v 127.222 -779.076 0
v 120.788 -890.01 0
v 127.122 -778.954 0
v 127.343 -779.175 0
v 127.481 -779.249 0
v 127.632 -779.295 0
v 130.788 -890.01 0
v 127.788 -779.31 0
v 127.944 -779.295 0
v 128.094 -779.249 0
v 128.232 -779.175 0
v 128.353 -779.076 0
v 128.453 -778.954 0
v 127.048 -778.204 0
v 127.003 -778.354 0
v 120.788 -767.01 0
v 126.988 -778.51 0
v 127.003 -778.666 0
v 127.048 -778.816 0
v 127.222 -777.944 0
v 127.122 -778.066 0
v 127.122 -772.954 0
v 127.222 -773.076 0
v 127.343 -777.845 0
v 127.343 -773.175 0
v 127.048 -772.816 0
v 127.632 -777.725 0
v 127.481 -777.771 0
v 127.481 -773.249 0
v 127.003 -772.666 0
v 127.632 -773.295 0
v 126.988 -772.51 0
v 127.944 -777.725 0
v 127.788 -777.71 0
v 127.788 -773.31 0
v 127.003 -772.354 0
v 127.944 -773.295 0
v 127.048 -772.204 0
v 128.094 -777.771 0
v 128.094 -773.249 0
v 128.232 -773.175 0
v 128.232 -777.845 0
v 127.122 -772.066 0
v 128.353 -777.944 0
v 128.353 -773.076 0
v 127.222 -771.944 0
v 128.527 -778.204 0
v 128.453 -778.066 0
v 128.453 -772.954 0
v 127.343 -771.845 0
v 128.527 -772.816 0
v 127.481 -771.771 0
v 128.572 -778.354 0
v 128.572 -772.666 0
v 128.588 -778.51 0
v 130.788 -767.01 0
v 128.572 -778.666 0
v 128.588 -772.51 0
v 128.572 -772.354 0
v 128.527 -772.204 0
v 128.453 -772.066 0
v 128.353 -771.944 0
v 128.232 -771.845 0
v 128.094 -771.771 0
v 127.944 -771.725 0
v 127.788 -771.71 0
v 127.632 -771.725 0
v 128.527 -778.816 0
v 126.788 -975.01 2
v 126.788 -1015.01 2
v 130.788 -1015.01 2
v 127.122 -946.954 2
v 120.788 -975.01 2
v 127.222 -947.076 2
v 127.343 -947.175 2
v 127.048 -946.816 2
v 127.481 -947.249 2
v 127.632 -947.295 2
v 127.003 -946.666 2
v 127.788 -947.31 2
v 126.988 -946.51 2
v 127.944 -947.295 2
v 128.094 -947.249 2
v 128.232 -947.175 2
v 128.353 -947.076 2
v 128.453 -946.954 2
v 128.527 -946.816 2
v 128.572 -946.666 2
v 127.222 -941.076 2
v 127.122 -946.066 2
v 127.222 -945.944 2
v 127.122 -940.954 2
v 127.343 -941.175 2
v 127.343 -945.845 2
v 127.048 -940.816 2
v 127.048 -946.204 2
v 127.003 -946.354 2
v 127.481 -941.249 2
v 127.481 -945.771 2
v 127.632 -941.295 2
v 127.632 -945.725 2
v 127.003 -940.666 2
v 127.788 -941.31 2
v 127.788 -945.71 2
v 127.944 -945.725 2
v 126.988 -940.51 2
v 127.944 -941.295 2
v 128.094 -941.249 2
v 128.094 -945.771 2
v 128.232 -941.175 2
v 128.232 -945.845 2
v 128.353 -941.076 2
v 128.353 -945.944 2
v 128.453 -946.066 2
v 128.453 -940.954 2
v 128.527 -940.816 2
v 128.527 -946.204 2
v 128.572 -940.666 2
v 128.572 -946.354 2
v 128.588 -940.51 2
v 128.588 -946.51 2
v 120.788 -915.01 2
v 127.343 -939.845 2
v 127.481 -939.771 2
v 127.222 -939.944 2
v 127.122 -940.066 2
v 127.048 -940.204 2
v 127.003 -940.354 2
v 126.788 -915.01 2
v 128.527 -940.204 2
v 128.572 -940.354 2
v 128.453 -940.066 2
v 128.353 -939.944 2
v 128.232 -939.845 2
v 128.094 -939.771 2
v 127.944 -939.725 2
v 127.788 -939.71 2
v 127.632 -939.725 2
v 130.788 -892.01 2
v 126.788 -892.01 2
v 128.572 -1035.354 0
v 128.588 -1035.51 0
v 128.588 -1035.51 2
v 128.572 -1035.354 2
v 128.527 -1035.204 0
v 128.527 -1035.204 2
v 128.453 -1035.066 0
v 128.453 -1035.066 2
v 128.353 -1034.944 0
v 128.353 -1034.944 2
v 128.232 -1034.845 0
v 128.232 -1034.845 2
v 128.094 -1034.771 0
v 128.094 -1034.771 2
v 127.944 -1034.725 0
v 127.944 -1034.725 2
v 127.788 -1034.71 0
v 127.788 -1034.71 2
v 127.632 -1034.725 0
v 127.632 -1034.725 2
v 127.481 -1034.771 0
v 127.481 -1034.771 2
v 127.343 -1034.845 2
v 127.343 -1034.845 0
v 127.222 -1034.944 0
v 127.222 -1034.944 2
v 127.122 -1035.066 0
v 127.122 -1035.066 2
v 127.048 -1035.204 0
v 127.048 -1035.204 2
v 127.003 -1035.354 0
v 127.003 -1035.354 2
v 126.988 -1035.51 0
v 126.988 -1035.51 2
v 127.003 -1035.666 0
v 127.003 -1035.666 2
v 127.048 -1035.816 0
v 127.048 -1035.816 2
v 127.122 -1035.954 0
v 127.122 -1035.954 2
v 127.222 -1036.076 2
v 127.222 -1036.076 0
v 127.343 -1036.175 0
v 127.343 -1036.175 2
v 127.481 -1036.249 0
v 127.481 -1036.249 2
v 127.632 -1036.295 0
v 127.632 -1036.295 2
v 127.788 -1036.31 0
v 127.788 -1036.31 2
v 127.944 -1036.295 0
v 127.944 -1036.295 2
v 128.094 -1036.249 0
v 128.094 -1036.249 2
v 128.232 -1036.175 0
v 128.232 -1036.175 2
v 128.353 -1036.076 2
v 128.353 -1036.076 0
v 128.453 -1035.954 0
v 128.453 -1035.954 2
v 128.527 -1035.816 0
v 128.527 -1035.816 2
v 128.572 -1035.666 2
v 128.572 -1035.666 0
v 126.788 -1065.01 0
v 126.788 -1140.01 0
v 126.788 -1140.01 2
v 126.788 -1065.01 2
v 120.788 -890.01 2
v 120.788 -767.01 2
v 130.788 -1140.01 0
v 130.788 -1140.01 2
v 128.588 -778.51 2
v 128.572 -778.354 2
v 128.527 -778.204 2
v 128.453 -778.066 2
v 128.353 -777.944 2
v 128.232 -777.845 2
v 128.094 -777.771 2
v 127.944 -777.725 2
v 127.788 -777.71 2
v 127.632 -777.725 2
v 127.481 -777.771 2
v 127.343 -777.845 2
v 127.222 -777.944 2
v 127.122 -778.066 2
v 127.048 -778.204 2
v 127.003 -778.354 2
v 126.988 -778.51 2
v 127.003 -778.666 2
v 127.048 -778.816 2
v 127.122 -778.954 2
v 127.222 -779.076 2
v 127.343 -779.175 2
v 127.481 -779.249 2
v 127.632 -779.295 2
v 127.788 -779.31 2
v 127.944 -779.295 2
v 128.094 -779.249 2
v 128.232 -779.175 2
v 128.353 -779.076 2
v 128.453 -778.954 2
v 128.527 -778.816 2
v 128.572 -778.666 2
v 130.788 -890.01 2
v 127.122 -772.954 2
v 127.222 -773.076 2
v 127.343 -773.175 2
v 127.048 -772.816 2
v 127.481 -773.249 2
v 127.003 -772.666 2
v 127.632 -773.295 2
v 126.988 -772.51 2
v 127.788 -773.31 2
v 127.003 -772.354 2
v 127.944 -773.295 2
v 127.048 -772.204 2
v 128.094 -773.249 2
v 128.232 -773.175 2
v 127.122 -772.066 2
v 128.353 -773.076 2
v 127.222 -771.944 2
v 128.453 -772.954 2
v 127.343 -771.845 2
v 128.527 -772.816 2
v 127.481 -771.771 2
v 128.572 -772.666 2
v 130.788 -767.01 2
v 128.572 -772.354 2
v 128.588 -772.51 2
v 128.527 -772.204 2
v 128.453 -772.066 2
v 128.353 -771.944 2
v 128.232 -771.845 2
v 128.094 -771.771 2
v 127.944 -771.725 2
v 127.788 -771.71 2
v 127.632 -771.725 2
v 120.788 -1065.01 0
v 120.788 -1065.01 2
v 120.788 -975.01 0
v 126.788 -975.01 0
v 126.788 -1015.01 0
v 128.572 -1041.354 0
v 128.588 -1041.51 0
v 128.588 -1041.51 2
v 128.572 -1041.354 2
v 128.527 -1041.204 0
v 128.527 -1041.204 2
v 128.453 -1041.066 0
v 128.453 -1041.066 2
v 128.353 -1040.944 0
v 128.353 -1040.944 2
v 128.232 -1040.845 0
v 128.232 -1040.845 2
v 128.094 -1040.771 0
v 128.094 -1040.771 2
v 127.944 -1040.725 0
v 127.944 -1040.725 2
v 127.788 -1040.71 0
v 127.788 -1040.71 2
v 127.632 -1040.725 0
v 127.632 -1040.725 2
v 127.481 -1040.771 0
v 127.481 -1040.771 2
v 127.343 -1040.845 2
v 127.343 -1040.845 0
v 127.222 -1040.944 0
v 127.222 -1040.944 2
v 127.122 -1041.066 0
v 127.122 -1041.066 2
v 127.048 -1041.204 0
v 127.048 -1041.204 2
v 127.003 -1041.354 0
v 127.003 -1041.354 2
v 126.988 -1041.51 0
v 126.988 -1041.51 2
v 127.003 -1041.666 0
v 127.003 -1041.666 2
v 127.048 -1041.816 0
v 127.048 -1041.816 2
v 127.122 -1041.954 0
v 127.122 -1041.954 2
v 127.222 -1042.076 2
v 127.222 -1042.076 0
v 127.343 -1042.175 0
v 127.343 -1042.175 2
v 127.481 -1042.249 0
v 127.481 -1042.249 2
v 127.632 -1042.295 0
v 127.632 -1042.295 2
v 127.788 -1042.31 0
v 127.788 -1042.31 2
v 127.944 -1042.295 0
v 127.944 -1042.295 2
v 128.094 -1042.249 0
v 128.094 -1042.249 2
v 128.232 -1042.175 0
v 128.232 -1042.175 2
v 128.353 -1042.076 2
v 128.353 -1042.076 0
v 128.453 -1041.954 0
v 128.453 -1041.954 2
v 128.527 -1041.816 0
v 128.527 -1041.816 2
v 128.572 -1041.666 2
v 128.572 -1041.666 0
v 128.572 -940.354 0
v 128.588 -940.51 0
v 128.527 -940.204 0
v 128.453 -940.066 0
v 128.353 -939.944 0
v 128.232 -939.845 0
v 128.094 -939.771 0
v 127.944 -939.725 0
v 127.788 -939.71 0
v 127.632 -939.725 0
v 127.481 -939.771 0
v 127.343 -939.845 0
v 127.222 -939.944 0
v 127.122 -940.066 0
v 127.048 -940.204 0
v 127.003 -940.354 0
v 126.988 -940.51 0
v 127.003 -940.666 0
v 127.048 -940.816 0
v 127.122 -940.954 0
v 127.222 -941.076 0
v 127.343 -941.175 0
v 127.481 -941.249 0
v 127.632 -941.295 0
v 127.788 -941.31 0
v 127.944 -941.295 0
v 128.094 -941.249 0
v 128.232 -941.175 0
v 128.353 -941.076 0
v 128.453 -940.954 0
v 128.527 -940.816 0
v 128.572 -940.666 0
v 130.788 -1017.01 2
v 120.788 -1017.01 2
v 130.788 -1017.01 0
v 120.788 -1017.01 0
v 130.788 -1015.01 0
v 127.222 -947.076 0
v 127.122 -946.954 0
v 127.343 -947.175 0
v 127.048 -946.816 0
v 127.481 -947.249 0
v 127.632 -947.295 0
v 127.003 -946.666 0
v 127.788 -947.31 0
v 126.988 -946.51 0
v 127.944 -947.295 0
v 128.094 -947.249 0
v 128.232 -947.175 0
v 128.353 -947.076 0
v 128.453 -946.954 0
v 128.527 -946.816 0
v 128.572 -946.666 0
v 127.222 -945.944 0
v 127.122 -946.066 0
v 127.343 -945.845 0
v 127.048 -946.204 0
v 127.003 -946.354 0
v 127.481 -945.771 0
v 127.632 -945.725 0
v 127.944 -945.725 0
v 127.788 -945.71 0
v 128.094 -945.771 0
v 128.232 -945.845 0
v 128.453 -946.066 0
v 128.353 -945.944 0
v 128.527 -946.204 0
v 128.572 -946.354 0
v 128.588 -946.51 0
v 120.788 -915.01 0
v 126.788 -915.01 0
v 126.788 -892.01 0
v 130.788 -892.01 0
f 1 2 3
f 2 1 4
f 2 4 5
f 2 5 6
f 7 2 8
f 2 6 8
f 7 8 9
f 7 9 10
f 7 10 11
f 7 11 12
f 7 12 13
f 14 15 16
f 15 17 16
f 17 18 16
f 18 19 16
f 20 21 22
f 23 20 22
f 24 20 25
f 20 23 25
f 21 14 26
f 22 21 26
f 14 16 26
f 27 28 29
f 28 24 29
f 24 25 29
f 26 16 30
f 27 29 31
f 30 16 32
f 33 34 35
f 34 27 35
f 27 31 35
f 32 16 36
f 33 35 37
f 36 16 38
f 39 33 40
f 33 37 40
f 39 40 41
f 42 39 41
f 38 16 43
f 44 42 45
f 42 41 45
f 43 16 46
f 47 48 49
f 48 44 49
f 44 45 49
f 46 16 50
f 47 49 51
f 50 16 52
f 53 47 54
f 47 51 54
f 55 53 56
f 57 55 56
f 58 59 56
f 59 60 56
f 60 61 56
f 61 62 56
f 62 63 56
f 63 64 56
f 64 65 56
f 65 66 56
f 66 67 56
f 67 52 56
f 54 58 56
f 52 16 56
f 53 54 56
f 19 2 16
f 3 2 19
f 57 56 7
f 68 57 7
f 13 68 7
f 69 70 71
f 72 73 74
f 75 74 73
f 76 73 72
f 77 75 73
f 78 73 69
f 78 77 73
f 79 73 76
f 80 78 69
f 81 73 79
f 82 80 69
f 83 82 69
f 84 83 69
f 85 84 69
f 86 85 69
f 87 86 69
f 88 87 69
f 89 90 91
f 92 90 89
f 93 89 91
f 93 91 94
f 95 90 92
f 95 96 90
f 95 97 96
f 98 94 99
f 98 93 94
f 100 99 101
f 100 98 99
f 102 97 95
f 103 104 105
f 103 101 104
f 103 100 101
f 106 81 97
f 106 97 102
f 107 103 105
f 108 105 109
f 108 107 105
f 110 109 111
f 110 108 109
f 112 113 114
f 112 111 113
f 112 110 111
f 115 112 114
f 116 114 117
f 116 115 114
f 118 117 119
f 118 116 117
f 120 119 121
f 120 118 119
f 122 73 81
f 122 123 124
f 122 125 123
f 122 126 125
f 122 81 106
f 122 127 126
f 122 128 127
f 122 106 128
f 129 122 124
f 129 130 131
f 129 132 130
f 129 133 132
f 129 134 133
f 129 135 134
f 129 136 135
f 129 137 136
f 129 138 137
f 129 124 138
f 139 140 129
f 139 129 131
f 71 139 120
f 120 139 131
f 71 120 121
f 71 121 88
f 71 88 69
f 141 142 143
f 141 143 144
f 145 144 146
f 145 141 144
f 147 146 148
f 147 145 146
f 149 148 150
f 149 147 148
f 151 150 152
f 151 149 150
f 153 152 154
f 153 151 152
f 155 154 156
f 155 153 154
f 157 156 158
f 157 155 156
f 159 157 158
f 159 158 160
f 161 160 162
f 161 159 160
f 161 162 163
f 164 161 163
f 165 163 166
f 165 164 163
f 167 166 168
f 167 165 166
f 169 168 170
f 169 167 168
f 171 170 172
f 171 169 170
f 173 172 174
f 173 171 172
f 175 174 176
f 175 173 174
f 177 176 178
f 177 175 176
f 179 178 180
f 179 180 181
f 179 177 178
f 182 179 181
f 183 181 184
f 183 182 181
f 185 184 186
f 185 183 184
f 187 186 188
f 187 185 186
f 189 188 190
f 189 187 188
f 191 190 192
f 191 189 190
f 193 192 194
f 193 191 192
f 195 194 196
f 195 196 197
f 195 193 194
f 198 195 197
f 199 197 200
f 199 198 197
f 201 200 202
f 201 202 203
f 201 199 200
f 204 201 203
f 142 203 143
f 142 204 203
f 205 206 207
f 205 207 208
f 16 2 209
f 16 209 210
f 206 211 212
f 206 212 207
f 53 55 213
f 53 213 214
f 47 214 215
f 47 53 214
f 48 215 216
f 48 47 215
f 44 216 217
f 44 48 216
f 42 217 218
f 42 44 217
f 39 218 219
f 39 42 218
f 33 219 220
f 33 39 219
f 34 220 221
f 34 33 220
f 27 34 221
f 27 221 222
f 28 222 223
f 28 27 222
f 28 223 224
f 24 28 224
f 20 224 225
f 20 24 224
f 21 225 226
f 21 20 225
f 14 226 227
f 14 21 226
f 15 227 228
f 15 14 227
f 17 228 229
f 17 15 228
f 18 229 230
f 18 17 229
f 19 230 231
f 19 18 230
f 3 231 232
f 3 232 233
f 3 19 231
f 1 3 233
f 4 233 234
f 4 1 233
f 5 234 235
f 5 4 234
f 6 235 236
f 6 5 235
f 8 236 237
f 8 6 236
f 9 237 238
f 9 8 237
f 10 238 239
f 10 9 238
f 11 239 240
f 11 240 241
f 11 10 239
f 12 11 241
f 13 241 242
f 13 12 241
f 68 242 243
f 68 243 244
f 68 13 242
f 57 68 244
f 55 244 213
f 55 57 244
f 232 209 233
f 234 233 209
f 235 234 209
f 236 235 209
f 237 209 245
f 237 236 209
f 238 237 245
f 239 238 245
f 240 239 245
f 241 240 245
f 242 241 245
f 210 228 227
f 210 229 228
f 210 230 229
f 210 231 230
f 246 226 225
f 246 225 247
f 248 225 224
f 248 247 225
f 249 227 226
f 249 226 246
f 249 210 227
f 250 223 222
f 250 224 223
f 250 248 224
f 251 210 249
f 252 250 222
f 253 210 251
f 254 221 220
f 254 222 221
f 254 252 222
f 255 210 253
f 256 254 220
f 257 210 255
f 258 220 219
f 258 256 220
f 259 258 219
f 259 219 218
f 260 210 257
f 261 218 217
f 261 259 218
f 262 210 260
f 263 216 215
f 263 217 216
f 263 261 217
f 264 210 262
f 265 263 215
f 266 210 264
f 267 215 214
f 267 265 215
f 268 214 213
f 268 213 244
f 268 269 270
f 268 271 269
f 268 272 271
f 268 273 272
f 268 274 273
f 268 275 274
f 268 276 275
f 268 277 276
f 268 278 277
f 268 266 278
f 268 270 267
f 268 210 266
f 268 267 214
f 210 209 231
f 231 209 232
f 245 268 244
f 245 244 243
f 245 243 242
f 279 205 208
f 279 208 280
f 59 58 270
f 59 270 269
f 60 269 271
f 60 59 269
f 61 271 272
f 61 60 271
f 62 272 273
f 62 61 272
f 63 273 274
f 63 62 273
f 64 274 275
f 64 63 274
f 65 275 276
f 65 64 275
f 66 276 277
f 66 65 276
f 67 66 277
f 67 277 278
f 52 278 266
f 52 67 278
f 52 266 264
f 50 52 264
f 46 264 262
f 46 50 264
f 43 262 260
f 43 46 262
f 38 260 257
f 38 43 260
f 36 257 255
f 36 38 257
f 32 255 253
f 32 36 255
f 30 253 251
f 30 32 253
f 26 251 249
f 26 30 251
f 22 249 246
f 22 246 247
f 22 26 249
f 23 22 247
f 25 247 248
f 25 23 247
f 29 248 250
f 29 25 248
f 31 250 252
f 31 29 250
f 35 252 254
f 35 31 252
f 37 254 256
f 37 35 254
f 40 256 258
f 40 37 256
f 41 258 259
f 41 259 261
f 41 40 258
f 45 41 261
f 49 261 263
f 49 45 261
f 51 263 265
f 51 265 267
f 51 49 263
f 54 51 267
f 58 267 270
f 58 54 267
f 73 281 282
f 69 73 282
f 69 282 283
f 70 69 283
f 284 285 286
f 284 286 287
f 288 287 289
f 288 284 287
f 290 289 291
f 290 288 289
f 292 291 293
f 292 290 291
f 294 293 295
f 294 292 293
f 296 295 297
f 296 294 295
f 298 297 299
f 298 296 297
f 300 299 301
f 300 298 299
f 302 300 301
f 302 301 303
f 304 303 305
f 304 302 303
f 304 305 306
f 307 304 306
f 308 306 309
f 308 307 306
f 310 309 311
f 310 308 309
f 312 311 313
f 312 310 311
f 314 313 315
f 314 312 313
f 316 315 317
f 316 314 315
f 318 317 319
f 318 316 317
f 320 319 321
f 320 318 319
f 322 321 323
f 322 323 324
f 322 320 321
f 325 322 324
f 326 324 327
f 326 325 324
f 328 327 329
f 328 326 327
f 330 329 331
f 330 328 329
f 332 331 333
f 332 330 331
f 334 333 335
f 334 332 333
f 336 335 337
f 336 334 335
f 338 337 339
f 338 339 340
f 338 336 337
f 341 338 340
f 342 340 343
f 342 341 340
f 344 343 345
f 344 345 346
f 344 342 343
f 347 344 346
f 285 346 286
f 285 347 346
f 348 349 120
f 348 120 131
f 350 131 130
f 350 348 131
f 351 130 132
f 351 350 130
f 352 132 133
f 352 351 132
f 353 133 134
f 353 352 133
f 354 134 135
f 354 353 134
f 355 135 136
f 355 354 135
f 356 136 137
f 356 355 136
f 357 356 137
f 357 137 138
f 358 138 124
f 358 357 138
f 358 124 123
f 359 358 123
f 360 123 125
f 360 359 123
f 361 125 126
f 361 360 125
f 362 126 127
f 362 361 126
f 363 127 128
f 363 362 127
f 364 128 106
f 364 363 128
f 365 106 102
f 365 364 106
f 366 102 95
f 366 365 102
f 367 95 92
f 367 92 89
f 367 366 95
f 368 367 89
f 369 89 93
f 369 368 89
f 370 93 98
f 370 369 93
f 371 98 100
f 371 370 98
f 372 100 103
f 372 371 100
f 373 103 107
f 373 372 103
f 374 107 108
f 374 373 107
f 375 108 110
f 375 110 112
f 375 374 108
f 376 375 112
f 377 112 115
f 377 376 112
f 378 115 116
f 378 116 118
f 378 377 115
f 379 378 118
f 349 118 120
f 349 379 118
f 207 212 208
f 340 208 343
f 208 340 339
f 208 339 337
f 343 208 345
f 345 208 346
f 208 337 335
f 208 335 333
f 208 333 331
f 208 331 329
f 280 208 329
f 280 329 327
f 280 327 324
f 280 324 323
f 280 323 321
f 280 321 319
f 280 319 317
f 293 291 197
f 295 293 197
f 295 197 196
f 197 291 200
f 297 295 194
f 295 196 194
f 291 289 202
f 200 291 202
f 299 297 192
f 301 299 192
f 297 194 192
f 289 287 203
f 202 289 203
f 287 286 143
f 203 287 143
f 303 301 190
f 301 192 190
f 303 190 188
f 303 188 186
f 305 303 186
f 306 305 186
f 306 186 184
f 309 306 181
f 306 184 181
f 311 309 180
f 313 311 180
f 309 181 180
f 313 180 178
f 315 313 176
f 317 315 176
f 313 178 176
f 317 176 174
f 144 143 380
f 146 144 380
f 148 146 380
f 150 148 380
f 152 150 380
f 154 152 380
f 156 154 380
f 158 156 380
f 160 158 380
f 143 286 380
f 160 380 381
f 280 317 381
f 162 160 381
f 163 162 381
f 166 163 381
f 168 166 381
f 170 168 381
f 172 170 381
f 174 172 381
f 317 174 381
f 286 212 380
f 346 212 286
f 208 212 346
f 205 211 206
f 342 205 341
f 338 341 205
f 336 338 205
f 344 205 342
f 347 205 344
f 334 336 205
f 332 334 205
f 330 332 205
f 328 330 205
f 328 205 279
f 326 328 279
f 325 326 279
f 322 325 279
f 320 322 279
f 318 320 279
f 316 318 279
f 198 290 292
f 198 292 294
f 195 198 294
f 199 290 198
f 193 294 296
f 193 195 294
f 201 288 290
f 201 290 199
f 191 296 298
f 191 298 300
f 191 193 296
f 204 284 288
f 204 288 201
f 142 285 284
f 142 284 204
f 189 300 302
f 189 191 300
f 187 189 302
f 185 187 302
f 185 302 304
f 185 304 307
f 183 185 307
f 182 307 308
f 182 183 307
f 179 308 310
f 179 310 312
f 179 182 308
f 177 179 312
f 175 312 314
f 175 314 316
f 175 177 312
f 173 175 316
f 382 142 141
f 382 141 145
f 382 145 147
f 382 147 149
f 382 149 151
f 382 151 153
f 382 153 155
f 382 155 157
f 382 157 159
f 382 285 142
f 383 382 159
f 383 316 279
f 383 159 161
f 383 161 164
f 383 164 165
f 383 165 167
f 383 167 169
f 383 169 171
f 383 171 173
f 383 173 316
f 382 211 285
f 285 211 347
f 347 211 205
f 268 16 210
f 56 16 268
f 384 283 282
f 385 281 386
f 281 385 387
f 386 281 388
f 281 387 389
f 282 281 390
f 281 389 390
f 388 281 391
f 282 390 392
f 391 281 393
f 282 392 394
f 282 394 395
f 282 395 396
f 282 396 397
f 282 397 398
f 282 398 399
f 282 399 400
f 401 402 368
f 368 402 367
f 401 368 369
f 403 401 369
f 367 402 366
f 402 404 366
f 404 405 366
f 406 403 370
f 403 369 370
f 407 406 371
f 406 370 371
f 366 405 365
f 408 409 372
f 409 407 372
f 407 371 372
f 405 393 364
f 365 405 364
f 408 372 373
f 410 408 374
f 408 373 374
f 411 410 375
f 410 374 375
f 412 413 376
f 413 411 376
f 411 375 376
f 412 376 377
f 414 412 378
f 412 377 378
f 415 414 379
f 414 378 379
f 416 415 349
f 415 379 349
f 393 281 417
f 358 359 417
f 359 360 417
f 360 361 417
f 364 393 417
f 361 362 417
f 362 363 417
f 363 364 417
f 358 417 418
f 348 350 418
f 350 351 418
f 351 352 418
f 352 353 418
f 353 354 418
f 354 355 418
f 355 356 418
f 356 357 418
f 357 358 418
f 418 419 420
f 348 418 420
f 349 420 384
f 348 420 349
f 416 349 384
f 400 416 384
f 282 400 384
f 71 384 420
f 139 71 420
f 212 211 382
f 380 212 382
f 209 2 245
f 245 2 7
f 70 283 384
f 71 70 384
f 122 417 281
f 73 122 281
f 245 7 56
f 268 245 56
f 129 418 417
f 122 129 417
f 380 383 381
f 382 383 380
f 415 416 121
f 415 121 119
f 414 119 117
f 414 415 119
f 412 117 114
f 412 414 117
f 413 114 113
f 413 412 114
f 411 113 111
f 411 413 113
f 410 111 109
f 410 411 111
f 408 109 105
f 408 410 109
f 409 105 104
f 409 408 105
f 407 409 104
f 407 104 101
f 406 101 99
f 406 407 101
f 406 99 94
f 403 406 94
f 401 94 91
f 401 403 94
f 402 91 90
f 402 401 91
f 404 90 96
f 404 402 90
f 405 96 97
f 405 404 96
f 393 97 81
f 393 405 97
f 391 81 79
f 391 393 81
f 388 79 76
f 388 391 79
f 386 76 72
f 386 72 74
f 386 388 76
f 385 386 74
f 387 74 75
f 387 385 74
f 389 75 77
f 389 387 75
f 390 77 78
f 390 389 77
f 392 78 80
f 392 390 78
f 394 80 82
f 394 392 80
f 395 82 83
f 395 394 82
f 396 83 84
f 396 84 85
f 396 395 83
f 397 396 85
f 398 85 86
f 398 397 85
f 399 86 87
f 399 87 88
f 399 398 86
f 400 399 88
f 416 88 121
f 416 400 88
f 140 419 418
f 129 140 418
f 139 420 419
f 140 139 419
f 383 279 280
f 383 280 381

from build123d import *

# Parameters (mm, degrees)
SKETCH_1_W        = 10
SKETCH_1_H        = 123
SKETCH_1_R        = 0.8
EXTRUDE_1_DEPTH   = 2
EXTRUDE_1_2_DEPTH = 2
EXTRUDE_1_3_DEPTH = 2


with BuildPart() as part:
    # 草图1 → 凸台-拉伸1 (new body)
    with BuildSketch(Plane.XY):
        with Locations((125.787596038, -828.51)):
            Rectangle(SKETCH_1_W, SKETCH_1_H)
        with Locations((127.787596038, -772.51)):
            Circle(SKETCH_1_R, mode=Mode.SUBTRACT)
        with Locations((127.787596038, -778.51)):
            Circle(SKETCH_1_R, mode=Mode.SUBTRACT)
    extrude(amount=EXTRUDE_1_DEPTH)


with BuildPart() as body_2:
    # 草图1 → Extrude 1 2 (new body)
    with BuildSketch(Plane.XY):
        Polygon((120.787596038, -975.01), (126.787596038, -975.01), (126.787596038, -1015.01), (130.787596038, -1015.01), (130.787596038, -985.01), (130.787596038, -925.01), (130.787596038, -892.01), (126.787596038, -892.01), (126.787596038, -915.01), (120.787596038, -915.01), align=None)
        with Locations((127.787596038, -940.51)):
            Circle(SKETCH_1_R, mode=Mode.SUBTRACT)
        with Locations((127.787596038, -946.51)):
            Circle(SKETCH_1_R, mode=Mode.SUBTRACT)
    extrude(amount=EXTRUDE_1_2_DEPTH)


with BuildPart() as body_3:
    # 草图1 → Extrude 1 3 (new body)
    with BuildSketch(Plane.XY):
        Polygon((120.787596038, -1017.01), (130.787596038, -1017.01), (130.787596038, -1076.01), (130.787596038, -1140.01), (126.787596038, -1140.01), (126.787596038, -1065.01), (120.787596038, -1065.01), align=None)
        with Locations((127.787596038, -1035.51)):
            Circle(SKETCH_1_R, mode=Mode.SUBTRACT)
        with Locations((127.787596038, -1041.51)):
            Circle(SKETCH_1_R, mode=Mode.SUBTRACT)
    extrude(amount=EXTRUDE_1_3_DEPTH)


solid = Compound([part.part, body_2.part, body_3.part])
